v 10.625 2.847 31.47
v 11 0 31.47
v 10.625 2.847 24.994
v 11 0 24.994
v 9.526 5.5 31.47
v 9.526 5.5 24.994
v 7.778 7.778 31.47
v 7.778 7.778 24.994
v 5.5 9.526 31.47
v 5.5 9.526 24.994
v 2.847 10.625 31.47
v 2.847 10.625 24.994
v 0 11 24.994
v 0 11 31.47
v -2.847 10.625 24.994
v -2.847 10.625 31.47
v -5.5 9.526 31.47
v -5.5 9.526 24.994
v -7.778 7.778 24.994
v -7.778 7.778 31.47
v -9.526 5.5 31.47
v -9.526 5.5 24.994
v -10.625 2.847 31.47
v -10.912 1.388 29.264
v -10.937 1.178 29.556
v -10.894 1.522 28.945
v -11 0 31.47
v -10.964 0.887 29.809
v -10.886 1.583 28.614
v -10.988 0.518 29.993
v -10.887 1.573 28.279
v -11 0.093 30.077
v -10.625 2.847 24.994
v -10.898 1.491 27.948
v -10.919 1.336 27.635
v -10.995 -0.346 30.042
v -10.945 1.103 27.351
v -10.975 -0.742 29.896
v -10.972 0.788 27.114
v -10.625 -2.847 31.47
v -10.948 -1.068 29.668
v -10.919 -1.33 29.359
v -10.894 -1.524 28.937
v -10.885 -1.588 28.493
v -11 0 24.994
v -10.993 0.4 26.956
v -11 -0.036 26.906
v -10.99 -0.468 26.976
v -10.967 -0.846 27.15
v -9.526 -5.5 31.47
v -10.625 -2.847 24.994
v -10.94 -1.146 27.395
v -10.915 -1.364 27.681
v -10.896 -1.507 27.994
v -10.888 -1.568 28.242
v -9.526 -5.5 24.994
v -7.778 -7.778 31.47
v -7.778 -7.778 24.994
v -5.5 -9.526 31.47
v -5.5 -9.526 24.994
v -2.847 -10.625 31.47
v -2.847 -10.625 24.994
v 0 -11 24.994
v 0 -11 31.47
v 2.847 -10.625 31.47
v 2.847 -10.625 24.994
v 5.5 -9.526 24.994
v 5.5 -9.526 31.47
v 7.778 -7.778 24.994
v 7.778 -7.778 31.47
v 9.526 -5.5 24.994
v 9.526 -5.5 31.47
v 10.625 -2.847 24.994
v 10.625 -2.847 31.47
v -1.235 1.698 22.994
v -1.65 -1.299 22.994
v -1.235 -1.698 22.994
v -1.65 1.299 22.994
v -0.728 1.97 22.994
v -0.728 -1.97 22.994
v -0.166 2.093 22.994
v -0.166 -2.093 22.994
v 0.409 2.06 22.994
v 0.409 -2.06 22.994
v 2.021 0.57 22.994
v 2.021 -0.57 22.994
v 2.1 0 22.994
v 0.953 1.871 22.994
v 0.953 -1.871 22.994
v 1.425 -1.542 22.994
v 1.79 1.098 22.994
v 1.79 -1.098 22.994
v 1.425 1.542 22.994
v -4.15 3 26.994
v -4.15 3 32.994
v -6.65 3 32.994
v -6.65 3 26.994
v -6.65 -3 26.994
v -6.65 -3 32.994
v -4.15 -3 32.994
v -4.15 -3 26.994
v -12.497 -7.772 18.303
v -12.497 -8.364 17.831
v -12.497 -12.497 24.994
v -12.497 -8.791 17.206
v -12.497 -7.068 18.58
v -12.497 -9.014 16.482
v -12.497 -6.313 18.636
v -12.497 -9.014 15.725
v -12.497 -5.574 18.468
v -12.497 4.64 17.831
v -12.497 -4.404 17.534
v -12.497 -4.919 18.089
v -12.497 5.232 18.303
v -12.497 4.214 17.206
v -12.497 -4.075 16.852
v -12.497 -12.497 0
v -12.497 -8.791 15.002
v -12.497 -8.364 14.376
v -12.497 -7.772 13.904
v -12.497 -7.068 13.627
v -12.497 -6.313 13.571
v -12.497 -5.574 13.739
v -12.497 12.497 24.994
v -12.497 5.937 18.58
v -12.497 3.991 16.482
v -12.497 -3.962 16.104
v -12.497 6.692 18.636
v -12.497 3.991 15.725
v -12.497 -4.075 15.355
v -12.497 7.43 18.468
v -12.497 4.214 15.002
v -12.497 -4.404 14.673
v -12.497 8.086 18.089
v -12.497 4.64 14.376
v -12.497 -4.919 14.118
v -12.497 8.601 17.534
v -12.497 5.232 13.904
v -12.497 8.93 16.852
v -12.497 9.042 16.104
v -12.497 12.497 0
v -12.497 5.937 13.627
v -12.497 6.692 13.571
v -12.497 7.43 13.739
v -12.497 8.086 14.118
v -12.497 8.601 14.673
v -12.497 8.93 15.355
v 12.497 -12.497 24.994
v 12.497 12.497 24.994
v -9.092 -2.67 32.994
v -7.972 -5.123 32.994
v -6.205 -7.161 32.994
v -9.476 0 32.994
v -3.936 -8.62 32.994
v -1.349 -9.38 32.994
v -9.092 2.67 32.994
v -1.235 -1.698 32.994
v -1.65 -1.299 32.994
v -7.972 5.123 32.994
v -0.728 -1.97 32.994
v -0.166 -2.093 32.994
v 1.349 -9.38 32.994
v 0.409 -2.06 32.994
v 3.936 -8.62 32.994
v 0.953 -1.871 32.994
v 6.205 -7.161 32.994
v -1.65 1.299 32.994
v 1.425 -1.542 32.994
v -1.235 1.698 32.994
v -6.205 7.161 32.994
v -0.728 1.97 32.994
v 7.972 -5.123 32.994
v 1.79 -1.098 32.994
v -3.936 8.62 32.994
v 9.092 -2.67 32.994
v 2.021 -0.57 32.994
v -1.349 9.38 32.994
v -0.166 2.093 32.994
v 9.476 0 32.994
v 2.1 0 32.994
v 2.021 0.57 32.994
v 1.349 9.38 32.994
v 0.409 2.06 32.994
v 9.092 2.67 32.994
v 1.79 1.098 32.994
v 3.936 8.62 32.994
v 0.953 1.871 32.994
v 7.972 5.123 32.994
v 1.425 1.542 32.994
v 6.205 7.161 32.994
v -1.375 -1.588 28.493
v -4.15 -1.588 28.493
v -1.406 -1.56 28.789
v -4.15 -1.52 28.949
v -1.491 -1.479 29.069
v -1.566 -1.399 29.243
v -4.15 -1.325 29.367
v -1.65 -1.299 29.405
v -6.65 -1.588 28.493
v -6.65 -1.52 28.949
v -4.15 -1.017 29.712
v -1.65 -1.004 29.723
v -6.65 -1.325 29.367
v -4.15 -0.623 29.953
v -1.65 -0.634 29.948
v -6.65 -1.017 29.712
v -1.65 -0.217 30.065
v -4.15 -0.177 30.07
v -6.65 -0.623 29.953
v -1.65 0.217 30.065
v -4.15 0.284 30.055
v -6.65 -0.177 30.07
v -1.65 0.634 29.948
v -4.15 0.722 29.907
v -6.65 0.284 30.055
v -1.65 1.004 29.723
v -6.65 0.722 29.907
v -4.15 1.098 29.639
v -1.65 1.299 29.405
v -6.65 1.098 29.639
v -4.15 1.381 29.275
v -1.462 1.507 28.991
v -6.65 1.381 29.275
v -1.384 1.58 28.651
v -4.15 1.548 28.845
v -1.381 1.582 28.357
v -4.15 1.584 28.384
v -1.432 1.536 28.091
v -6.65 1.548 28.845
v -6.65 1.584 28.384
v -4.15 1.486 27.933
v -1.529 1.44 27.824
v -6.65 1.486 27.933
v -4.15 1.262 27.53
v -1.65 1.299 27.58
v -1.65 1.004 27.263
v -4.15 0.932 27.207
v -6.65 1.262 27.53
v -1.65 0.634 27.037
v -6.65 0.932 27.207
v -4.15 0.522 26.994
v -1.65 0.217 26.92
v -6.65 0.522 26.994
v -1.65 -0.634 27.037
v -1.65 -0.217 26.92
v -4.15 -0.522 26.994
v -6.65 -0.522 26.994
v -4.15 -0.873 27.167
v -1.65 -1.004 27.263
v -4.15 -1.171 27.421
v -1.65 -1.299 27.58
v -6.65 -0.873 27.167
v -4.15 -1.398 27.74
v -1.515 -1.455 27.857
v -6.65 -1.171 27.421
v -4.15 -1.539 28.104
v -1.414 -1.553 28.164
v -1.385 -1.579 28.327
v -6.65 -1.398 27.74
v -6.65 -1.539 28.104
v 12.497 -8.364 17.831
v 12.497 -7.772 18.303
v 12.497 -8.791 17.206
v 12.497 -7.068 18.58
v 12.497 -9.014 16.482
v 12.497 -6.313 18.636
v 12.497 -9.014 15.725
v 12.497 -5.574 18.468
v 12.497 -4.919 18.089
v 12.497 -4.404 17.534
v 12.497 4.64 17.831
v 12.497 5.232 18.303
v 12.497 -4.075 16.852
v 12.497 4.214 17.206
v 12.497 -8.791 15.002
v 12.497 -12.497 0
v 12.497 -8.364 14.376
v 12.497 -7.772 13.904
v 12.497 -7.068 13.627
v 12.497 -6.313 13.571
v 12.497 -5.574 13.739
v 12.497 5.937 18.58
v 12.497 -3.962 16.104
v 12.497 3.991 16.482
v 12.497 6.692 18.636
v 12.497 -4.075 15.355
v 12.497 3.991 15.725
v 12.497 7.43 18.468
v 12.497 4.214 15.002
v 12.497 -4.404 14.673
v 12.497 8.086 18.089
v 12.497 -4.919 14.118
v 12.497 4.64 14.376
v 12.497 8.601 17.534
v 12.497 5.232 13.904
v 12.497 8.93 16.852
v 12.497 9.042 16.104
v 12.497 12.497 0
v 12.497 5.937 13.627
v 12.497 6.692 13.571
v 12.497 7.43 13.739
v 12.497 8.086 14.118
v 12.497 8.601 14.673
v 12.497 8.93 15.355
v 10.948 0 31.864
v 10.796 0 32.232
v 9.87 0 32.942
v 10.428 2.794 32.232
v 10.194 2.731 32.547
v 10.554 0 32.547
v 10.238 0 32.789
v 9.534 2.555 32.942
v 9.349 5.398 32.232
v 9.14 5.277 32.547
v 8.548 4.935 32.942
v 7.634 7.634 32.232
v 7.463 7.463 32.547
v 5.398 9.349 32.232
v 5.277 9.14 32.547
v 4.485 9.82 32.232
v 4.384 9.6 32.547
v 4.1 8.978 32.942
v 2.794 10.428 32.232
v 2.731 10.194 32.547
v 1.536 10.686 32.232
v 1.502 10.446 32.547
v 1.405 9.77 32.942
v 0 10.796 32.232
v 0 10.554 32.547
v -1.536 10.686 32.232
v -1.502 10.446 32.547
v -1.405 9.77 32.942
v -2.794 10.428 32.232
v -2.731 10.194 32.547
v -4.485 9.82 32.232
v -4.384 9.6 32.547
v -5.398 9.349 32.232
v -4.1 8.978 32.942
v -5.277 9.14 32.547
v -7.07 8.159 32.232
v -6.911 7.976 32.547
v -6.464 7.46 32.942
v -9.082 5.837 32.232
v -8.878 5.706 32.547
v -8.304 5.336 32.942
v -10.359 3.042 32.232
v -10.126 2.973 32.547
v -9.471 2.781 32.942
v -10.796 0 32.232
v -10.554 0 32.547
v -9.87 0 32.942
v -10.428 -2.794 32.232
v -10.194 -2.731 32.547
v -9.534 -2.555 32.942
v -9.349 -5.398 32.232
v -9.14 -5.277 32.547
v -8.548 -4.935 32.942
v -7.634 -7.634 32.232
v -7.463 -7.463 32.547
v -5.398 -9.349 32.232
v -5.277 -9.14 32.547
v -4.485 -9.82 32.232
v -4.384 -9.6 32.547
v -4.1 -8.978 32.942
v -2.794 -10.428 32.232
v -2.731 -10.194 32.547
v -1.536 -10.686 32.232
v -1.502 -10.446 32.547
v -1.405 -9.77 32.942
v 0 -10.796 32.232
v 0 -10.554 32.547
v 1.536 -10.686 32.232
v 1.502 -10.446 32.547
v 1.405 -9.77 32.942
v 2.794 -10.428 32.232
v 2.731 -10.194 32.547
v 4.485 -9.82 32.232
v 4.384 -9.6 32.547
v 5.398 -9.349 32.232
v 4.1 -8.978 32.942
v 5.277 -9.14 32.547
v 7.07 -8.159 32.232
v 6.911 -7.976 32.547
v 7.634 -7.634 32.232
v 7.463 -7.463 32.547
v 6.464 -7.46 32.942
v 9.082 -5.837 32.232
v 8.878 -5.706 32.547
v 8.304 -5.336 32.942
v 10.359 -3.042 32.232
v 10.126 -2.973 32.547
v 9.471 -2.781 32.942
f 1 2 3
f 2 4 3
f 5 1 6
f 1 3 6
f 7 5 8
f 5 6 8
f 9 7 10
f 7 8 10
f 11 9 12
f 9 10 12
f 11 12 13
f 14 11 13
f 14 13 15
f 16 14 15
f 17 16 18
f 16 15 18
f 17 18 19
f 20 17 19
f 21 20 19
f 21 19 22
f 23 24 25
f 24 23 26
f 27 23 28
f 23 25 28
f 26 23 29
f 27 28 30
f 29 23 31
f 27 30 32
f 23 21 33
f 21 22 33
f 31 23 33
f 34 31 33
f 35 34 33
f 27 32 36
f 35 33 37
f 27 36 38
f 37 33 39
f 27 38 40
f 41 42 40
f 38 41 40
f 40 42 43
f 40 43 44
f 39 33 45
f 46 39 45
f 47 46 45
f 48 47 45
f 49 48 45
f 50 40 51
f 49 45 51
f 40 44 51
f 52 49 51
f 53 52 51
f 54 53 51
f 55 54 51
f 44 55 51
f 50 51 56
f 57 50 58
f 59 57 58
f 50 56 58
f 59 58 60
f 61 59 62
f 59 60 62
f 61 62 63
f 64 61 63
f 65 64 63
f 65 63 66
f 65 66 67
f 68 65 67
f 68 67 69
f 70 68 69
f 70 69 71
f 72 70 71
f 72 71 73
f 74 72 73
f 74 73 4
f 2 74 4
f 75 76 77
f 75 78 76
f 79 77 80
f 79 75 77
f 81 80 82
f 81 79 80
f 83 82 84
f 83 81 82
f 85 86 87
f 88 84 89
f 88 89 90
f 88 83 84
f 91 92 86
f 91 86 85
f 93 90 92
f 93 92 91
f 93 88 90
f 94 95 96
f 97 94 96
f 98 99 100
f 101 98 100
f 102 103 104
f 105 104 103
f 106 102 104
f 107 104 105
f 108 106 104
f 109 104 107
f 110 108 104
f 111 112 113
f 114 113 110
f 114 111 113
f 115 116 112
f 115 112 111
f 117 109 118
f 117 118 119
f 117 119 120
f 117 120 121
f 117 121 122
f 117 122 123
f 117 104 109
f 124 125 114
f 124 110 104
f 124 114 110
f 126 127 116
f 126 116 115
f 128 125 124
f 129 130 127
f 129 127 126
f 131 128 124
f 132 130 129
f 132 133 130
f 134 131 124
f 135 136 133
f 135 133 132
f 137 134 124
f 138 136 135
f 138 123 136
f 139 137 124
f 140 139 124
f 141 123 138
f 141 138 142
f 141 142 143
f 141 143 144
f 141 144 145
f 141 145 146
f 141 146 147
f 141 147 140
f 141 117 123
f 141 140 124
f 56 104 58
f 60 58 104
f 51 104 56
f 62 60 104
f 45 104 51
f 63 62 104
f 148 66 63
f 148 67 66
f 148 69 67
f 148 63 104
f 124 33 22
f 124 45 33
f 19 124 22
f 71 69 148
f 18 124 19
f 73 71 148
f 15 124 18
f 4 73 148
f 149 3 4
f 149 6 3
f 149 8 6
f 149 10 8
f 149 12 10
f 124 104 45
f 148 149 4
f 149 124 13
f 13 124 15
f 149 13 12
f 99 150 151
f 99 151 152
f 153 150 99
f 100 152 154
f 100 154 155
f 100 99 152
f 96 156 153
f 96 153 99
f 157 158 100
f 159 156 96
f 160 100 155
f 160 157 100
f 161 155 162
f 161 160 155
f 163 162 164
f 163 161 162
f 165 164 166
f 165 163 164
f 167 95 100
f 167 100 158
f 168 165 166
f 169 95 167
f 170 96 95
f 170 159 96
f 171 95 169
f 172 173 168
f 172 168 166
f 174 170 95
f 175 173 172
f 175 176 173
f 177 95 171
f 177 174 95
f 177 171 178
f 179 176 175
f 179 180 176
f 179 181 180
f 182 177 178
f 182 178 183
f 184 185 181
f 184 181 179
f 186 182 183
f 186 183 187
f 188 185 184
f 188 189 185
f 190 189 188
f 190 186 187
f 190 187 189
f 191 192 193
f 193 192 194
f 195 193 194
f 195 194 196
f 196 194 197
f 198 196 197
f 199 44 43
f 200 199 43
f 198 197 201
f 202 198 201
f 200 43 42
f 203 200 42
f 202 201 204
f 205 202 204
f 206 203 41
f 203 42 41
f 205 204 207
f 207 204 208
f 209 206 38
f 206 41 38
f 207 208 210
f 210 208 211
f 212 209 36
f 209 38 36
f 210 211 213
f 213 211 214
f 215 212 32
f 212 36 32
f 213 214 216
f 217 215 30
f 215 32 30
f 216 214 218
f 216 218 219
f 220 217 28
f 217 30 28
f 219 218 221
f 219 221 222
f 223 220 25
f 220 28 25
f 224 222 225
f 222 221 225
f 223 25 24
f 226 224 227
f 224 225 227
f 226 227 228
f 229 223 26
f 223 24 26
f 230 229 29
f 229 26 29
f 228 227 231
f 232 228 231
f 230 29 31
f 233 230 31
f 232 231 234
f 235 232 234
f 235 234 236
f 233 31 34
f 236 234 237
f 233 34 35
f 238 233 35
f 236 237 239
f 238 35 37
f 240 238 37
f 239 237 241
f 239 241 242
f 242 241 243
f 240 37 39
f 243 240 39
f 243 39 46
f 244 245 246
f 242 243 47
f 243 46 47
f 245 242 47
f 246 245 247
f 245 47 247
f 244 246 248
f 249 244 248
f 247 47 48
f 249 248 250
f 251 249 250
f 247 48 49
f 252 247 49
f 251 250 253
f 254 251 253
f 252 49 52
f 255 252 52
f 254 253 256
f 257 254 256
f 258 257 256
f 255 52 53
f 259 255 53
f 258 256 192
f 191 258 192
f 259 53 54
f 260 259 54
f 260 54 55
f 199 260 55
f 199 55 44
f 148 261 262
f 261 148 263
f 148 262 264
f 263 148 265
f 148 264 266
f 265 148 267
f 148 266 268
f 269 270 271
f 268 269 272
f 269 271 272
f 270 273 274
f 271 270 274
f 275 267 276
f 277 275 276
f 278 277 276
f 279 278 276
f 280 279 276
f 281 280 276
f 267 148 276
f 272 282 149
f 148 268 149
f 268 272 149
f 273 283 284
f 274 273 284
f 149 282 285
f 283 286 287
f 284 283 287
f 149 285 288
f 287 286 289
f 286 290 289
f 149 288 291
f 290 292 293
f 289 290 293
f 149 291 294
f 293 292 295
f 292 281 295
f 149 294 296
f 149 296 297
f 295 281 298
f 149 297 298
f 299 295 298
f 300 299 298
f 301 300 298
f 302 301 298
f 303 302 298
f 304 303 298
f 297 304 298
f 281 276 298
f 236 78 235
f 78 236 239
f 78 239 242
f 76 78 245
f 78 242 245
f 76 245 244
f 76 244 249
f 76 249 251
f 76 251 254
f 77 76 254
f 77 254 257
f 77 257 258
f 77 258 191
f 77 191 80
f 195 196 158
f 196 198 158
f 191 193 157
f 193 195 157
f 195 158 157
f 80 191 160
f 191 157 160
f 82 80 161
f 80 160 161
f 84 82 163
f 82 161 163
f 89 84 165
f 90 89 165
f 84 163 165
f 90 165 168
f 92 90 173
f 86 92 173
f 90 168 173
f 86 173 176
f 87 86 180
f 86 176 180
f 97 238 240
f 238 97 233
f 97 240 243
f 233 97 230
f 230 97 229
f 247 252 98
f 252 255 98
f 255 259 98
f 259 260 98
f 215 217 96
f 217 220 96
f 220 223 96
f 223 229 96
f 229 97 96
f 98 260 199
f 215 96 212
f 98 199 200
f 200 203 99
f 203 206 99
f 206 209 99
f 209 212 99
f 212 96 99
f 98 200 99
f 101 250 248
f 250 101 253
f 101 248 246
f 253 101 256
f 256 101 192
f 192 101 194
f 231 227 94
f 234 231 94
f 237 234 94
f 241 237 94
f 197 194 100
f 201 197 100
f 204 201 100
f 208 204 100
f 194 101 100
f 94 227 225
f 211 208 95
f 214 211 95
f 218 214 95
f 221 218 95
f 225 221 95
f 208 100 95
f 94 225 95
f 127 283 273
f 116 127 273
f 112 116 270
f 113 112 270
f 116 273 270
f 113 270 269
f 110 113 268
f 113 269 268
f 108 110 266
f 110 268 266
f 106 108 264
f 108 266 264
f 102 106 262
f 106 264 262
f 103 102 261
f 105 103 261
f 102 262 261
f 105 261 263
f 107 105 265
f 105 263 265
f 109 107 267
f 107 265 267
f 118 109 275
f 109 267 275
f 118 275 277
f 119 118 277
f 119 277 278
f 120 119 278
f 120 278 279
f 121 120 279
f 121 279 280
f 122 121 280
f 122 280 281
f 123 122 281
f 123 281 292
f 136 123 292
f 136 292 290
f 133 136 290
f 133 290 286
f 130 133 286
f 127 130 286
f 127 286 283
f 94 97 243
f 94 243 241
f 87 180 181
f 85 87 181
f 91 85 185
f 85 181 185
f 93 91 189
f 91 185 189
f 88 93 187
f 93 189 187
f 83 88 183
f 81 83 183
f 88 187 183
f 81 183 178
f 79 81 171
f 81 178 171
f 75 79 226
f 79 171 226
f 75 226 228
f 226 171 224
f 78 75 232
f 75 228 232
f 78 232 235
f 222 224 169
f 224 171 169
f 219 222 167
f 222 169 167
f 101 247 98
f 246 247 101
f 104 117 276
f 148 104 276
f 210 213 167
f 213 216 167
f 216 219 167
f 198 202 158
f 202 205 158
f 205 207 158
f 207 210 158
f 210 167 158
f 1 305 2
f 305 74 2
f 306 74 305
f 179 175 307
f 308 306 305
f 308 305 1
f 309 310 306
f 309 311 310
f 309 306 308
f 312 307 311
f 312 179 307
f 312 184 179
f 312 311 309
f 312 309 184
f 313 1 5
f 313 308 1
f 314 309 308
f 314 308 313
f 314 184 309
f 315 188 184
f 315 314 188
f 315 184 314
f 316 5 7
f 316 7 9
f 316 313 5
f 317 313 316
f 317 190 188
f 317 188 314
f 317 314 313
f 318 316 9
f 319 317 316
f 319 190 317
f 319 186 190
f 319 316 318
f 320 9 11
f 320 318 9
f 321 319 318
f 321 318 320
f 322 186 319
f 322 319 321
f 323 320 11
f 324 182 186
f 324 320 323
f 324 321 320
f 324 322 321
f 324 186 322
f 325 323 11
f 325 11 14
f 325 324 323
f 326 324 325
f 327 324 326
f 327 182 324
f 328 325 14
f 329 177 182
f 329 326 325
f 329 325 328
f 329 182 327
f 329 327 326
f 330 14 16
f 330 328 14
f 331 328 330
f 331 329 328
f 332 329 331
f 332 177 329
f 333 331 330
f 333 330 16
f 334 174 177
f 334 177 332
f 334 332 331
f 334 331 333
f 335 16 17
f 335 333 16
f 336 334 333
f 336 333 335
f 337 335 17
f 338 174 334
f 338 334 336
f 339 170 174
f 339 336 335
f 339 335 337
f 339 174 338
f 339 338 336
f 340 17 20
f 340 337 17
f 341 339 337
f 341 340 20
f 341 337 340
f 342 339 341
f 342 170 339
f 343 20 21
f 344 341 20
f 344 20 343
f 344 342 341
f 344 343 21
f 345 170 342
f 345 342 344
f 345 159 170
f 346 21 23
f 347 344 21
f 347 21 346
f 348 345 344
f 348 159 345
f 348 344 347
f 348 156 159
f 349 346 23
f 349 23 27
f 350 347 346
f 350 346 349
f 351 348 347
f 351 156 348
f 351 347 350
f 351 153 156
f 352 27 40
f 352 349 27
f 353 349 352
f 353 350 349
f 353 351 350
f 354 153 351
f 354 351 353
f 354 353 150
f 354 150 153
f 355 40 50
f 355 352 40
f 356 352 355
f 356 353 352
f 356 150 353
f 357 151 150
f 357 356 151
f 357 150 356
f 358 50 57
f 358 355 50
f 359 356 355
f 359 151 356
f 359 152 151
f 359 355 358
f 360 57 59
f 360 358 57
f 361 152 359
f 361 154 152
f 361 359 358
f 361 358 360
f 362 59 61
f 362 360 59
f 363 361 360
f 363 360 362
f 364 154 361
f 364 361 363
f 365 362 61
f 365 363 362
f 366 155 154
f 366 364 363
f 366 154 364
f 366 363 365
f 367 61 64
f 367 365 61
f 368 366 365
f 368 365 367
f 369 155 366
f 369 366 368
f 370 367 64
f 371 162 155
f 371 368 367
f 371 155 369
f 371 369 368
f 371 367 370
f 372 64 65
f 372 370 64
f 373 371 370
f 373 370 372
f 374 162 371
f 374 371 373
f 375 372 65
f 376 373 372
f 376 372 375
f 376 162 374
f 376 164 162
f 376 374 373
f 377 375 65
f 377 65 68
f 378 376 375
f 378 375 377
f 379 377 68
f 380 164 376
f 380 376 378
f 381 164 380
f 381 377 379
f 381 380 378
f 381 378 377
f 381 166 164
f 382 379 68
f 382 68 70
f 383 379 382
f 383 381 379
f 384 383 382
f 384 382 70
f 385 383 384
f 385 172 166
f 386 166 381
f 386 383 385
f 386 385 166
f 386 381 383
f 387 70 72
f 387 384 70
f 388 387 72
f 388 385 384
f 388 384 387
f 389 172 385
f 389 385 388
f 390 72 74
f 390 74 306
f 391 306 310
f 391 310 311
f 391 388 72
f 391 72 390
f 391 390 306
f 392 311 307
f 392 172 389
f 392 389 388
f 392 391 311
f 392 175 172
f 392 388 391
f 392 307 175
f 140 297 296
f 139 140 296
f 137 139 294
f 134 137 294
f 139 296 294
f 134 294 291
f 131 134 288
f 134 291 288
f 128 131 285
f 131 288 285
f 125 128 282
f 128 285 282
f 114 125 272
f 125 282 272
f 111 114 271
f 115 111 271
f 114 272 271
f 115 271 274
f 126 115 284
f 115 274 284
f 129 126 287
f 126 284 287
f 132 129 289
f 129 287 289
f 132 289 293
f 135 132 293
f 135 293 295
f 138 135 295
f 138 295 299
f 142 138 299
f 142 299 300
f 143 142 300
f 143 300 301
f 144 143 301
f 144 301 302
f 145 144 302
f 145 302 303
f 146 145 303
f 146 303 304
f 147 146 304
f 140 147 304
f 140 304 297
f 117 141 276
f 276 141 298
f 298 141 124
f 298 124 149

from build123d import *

# Parameters (mm, degrees)
F0_W      = 24.9936
F0_H      = 24.9936
F1_DEPTH  = 24.9936
F2_R      = 11
F3_DEPTH  = 8
F4_R      = 1.524
F6_DEPTH  = 10
F8_DEPTH  = 6
F9_R      = 1.5875
F10_DEPTH = 11.684
F11_R     = 2.54
F12_DEPTH = 25.4


with BuildPart() as f1:
    # F0 (on Top) → F1 (new body)
    with BuildSketch(Plane.XY):
        Rectangle(F0_W, F0_H)
    extrude(amount=F1_DEPTH)

    # F2 (on face) → F3 (join)
    with BuildSketch(Plane.XY.offset(24.9936)):
        Circle(F2_R)
    extrude(amount=F3_DEPTH)

    # F4
    f4_edges = [f1.edges().sort_by_distance(p)[0] for p in [
        (-11, 0, 32.9936),
    ]]
    fillet(f4_edges, radius=F4_R)

    # F5 (on face) → F6 (cut)
    with BuildSketch(Plane.XY.offset(32.9936)):
        with BuildLine():
            Line((-1.65, 0), (-1.65, -1.299038))
            ThreePointArc((-1.65, -1.299038), (0.687386, -1.984313), (2.1, 0))
            Line((2.1, 0), (-1.65, 0))
        make_face()
        with BuildLine():
            Line((-1.65, 0), (2.1, 0))
            ThreePointArc((2.1, 0), (0.687386, 1.984313), (-1.65, 1.299038))
            Line((-1.65, 1.299038), (-1.65, 0))
        make_face()
    extrude(amount=-F6_DEPTH, mode=Mode.SUBTRACT)

    # F7 (on face) → F8 (cut)
    with BuildSketch(Plane.XY.offset(32.9936)):
        Polygon((-4.15, 0), (-4.15, 3), (-6.65, 3), (-6.65, -3), (-4.15, -3), align=None)
    extrude(amount=-F8_DEPTH, mode=Mode.SUBTRACT)

    # F9 (on face) → F10 (cut)
    with BuildSketch(Plane(origin=(-12.4968, 0, 0), x_dir=(0, -1, 0), z_dir=(-1, 0, 0))):
        with Locations((0, 28.492712)):
            Circle(F9_R)
    extrude(amount=-F10_DEPTH, mode=Mode.SUBTRACT)

    # F11 (on face) → F12 (cut)
    with BuildSketch(Plane.YZ.offset(12.4968)):
        with Locations((-6.5024, 16.1036)):
            Circle(F11_R)
        with Locations((6.5024, 16.1036)):
            Circle(F11_R)
    extrude(amount=-F12_DEPTH, mode=Mode.SUBTRACT)


solid = f1.part
